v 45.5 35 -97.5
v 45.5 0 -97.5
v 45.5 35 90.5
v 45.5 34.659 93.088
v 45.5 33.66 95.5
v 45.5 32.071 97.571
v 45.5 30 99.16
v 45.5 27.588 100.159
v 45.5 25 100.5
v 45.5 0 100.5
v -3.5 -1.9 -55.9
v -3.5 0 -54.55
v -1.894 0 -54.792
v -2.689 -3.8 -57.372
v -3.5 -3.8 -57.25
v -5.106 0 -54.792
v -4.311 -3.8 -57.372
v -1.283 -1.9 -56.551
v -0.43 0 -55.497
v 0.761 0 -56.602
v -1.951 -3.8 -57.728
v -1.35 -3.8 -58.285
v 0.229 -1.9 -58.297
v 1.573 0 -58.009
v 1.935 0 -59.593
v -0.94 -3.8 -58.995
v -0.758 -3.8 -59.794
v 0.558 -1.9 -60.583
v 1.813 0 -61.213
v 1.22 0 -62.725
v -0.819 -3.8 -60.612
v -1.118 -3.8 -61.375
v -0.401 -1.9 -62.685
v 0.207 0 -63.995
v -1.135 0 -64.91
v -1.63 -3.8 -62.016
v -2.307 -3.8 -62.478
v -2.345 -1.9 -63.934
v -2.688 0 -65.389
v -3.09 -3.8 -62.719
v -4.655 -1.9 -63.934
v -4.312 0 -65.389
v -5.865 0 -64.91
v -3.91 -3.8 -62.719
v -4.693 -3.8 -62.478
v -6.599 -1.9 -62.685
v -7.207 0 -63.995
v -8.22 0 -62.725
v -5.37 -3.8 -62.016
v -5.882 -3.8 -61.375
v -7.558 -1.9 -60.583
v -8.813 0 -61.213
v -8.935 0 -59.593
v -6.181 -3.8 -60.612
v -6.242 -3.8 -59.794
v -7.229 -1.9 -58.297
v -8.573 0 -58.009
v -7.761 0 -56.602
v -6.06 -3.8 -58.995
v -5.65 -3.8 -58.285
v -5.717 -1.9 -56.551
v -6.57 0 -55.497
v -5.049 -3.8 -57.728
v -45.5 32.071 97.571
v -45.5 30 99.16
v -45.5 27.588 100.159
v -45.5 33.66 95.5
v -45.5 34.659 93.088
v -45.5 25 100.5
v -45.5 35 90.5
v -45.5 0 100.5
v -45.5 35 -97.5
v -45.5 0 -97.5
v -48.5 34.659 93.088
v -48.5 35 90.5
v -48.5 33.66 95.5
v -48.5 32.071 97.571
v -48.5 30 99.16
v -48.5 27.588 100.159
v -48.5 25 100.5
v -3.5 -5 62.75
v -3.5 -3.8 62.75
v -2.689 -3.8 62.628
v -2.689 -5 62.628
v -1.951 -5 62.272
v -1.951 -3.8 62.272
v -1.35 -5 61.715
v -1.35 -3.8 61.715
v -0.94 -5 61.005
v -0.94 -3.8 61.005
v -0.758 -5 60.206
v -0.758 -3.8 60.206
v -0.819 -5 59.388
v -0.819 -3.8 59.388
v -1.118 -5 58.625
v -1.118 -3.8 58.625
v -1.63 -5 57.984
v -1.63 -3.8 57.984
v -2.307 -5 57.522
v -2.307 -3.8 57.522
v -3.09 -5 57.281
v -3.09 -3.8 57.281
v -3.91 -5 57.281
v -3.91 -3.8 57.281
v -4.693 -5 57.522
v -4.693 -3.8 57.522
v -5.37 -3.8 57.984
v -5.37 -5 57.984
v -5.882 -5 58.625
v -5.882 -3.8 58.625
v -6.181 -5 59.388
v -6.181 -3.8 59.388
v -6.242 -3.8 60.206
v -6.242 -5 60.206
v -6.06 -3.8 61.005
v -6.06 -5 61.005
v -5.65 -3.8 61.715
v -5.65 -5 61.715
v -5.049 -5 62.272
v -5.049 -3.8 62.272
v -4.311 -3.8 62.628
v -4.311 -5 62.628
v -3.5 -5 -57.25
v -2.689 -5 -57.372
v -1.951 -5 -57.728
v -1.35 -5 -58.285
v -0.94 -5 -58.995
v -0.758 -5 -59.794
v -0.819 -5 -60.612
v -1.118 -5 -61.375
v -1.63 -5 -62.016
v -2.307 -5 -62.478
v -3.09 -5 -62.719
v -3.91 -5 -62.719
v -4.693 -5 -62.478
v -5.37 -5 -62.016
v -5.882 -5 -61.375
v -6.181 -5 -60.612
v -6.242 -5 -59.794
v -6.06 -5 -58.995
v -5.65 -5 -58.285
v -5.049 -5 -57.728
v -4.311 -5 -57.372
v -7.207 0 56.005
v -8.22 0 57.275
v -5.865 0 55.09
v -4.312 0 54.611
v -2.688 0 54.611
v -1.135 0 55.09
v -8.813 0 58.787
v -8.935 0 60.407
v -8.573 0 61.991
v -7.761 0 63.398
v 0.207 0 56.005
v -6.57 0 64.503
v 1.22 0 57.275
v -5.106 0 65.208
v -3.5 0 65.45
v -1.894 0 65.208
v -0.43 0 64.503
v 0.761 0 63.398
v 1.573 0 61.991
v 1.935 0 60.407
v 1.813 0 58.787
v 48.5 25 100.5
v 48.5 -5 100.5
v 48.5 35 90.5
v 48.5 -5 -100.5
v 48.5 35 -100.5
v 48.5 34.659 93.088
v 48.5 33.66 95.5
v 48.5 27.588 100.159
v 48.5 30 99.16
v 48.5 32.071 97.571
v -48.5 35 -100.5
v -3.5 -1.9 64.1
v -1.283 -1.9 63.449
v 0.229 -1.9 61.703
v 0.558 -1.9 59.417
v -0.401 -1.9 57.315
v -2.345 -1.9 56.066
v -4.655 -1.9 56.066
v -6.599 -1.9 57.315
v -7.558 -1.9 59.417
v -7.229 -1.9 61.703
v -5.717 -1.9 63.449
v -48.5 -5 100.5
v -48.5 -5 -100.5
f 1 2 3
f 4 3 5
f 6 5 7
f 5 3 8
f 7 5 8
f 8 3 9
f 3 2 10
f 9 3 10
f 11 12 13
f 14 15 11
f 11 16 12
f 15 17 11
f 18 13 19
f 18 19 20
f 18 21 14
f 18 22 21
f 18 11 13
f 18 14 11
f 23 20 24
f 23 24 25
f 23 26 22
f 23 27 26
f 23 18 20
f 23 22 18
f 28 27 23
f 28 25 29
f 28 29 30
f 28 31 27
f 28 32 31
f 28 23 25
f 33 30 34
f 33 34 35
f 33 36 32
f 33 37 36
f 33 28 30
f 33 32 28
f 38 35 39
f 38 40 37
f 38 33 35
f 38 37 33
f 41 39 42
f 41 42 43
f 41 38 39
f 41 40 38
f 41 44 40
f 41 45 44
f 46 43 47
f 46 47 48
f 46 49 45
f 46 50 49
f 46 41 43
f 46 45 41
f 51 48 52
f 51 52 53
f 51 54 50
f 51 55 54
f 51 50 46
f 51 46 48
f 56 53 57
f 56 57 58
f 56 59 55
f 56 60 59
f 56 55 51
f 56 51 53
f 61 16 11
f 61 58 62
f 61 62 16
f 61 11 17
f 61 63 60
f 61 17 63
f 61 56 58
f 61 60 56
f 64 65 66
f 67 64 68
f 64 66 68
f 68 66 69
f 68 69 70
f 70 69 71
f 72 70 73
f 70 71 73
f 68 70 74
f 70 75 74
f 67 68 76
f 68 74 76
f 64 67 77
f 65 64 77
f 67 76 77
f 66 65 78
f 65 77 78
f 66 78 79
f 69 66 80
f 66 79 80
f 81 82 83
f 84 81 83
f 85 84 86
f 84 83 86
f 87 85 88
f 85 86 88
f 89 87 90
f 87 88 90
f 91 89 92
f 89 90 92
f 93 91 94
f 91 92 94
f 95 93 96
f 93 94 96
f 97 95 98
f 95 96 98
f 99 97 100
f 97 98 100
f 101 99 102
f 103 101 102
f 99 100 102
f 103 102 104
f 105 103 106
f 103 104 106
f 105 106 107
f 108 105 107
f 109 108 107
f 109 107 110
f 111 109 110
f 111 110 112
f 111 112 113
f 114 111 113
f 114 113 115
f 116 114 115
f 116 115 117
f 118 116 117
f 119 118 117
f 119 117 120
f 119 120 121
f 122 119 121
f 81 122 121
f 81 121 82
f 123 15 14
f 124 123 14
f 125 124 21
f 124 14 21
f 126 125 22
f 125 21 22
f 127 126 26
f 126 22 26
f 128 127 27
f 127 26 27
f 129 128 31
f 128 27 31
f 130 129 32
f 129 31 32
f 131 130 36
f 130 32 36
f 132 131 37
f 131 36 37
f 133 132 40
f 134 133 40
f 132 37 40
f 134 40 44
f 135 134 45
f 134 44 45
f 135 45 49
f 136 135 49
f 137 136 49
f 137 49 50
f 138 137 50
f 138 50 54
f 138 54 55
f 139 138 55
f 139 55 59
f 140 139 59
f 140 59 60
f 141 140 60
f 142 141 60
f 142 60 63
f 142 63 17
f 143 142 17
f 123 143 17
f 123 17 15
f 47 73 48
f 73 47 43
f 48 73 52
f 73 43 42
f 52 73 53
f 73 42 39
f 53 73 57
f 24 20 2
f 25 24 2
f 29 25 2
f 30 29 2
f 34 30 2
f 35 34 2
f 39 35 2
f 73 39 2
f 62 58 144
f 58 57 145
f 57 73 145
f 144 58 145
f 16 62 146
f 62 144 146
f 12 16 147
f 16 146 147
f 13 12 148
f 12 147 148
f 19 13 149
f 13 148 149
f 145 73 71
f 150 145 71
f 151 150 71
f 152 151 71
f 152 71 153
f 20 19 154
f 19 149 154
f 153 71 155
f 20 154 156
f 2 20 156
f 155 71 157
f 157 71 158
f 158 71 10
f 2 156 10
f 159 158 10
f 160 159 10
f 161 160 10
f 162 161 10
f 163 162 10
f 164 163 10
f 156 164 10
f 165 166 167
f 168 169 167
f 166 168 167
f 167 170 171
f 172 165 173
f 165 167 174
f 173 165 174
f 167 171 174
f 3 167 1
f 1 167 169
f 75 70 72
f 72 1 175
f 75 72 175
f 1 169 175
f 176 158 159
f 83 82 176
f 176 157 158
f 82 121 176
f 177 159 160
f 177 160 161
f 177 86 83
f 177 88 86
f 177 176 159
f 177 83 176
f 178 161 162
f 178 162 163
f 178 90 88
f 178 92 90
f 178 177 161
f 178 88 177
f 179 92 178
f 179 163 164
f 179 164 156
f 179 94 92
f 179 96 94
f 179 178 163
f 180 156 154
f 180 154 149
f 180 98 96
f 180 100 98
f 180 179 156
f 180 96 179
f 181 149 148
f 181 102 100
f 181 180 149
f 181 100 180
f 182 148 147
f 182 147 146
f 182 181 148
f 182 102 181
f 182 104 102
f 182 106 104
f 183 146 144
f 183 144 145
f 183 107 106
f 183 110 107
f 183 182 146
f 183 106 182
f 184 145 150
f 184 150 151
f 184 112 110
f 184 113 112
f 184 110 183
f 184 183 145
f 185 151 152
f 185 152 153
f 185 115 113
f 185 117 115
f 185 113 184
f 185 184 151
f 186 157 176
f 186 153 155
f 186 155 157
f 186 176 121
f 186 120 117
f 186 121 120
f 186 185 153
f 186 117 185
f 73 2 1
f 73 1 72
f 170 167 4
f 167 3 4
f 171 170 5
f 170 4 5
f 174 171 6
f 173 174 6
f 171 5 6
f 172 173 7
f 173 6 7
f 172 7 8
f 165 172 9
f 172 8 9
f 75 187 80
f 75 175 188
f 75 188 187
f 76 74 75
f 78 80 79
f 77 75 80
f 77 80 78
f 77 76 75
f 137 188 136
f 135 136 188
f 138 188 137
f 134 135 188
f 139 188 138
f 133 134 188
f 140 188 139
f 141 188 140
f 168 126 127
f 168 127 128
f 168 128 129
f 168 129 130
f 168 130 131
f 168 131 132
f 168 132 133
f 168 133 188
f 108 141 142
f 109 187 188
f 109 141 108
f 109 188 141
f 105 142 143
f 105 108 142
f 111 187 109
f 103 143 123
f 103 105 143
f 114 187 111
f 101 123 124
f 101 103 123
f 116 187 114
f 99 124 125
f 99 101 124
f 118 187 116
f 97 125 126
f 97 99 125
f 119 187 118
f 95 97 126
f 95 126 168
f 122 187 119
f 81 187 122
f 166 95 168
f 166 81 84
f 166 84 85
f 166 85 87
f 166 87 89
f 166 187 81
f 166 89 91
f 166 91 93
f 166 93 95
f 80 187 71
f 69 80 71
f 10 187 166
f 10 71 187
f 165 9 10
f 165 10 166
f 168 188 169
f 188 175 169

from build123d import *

# Parameters (mm, degrees)
BOSS_EXTRUDE1_DEPTH = 35
SKETCH3_W           = 97
SKETCH3_H           = 201
BOSS_EXTRUDE2_DEPTH = 5
FILLET1_R           = 10
SKETCH4_R           = 2.75
CUT_EXTRUDE1_DEPTH  = 10
CHAMFER3_SIZE       = 2.7
CHAMFER3_SIZE2      = 3.8
CHAMFER4_SIZE       = 2.7
CHAMFER4_SIZE2      = 3.8


with BuildPart() as part:
    # Sketch1 → Boss-Extrude1 (new body)
    with BuildSketch(Plane(origin=(0, 0, 0), x_dir=(1, 0, 0), z_dir=(0, 1, 0))):
        Polygon((-45.5, -97.5), (-45.5, -100.5), (-48.5, -100.5), (-48.5, 100.5), (48.5, 100.5), (48.5, -100.5), (45.5, -100.5), (45.5, -97.5), (45.5, 97.5), (-45.5, 97.5), align=None)
    extrude(amount=BOSS_EXTRUDE1_DEPTH)

    # Sketch3 → Boss-Extrude2 (add)
    with BuildSketch(Plane.XZ):
        Rectangle(SKETCH3_W, SKETCH3_H)
    extrude(amount=BOSS_EXTRUDE2_DEPTH)

    # Fillet1
    fillet1_edges = [part.edges().sort_by_distance(p)[0] for p in [
        (47, 35, 100.5),
        (-47, 35, 100.5),
    ]]
    fillet(fillet1_edges, radius=FILLET1_R)

    # Sketch4 → Cut-Extrude1 (cut)
    with BuildSketch(Plane(origin=(0, 0, 0), x_dir=(1, 0, 0), z_dir=(0, 1, 0))):
        with Locations(Location((-3.5, 60, 0), (0, 0, 270))):
            Circle(SKETCH4_R)
        with Locations(Location((-3.5, -60, 0), (0, 0, 270))):
            Circle(SKETCH4_R)
    extrude(amount=-CUT_EXTRUDE1_DEPTH, mode=Mode.SUBTRACT)

    # Chamfer3
    chamfer3_edges = [part.edges().sort_by_distance(p)[0] for p in [
        (-3.5, 0, 57.25),
    ]]
    chamfer3_side = [part.faces().sort_by_distance(p)[0] for p in [
        (0.009254512, 0, 1.50396622),
    ]]
    chamfer(chamfer3_edges, length=CHAMFER3_SIZE, length2=CHAMFER3_SIZE2, reference=chamfer3_side[0])

    # Chamfer4
    chamfer4_edges = [part.edges().sort_by_distance(p)[0] for p in [
        (-3.5, 0, -62.75),
    ]]
    chamfer4_side = [part.faces().sort_by_distance(p)[0] for p in [
        (0.022889878, 0, 1.276677255),
    ]]
    chamfer(chamfer4_edges, length=CHAMFER4_SIZE, length2=CHAMFER4_SIZE2, reference=chamfer4_side[0])


solid = part.part
